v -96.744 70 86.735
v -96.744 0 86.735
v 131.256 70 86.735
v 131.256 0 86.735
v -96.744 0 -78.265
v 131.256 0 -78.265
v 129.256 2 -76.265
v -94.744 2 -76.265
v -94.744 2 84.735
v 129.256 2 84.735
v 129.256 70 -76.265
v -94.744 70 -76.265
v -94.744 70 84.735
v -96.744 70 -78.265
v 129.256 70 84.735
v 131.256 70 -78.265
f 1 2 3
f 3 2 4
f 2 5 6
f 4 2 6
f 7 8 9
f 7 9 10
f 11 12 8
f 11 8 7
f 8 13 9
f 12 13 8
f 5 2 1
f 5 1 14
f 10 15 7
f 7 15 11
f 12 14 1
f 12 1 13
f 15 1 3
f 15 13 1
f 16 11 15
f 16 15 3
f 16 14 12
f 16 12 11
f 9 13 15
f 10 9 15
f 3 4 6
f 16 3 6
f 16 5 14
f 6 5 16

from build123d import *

# Parameters (mm, degrees)
SKETCH1_W           = 228
SKETCH1_H           = 165
BOSS_EXTRUDE1_DEPTH = 70
SKETCH2_OUTSIDE_W   = 288.004
SKETCH2_OUTSIDE_H   = 225.004
SKETCH2_OUTSIDE_W_2 = 228
SKETCH2_OUTSIDE_H_2 = 165
SKETCH2_OUTSIDE_W_3 = 224
SKETCH2_OUTSIDE_H_3 = 161
CUT_EXTRUDE1_DEPTH  = 68


with BuildPart() as part:
    # Sketch1 → Boss-Extrude1 (new body)
    with BuildSketch(Plane(origin=(0, 0, 0), x_dir=(1, 0, 0), z_dir=(0, 1, 0))):
        with Locations((17.256257449, -4.235399285)):
            Rectangle(SKETCH1_W, SKETCH1_H)
    extrude(amount=BOSS_EXTRUDE1_DEPTH)

    # Sketch2 outside → Cut-Extrude1 (cut)
    # profile 1 of 2: a face of its own
    with BuildSketch(Plane(origin=(0, 70, 0), x_dir=(1, 0, 0), z_dir=(0, 1, 0))):
        with Locations((17.256, -4.235)):
            Rectangle(SKETCH2_OUTSIDE_W, SKETCH2_OUTSIDE_H)
        with Locations((17.256257449, -4.235399285)):
            Rectangle(SKETCH2_OUTSIDE_W_2, SKETCH2_OUTSIDE_H_2, mode=Mode.SUBTRACT)
    # profile 2 of 2: a face of its own
    with BuildSketch(Plane(origin=(0, 70, 0), x_dir=(1, 0, 0), z_dir=(0, 1, 0))):
        with Locations((17.256257449, -4.235399285)):
            Rectangle(SKETCH2_OUTSIDE_W_3, SKETCH2_OUTSIDE_H_3)
    extrude(amount=-CUT_EXTRUDE1_DEPTH, mode=Mode.SUBTRACT)


solid = part.part
